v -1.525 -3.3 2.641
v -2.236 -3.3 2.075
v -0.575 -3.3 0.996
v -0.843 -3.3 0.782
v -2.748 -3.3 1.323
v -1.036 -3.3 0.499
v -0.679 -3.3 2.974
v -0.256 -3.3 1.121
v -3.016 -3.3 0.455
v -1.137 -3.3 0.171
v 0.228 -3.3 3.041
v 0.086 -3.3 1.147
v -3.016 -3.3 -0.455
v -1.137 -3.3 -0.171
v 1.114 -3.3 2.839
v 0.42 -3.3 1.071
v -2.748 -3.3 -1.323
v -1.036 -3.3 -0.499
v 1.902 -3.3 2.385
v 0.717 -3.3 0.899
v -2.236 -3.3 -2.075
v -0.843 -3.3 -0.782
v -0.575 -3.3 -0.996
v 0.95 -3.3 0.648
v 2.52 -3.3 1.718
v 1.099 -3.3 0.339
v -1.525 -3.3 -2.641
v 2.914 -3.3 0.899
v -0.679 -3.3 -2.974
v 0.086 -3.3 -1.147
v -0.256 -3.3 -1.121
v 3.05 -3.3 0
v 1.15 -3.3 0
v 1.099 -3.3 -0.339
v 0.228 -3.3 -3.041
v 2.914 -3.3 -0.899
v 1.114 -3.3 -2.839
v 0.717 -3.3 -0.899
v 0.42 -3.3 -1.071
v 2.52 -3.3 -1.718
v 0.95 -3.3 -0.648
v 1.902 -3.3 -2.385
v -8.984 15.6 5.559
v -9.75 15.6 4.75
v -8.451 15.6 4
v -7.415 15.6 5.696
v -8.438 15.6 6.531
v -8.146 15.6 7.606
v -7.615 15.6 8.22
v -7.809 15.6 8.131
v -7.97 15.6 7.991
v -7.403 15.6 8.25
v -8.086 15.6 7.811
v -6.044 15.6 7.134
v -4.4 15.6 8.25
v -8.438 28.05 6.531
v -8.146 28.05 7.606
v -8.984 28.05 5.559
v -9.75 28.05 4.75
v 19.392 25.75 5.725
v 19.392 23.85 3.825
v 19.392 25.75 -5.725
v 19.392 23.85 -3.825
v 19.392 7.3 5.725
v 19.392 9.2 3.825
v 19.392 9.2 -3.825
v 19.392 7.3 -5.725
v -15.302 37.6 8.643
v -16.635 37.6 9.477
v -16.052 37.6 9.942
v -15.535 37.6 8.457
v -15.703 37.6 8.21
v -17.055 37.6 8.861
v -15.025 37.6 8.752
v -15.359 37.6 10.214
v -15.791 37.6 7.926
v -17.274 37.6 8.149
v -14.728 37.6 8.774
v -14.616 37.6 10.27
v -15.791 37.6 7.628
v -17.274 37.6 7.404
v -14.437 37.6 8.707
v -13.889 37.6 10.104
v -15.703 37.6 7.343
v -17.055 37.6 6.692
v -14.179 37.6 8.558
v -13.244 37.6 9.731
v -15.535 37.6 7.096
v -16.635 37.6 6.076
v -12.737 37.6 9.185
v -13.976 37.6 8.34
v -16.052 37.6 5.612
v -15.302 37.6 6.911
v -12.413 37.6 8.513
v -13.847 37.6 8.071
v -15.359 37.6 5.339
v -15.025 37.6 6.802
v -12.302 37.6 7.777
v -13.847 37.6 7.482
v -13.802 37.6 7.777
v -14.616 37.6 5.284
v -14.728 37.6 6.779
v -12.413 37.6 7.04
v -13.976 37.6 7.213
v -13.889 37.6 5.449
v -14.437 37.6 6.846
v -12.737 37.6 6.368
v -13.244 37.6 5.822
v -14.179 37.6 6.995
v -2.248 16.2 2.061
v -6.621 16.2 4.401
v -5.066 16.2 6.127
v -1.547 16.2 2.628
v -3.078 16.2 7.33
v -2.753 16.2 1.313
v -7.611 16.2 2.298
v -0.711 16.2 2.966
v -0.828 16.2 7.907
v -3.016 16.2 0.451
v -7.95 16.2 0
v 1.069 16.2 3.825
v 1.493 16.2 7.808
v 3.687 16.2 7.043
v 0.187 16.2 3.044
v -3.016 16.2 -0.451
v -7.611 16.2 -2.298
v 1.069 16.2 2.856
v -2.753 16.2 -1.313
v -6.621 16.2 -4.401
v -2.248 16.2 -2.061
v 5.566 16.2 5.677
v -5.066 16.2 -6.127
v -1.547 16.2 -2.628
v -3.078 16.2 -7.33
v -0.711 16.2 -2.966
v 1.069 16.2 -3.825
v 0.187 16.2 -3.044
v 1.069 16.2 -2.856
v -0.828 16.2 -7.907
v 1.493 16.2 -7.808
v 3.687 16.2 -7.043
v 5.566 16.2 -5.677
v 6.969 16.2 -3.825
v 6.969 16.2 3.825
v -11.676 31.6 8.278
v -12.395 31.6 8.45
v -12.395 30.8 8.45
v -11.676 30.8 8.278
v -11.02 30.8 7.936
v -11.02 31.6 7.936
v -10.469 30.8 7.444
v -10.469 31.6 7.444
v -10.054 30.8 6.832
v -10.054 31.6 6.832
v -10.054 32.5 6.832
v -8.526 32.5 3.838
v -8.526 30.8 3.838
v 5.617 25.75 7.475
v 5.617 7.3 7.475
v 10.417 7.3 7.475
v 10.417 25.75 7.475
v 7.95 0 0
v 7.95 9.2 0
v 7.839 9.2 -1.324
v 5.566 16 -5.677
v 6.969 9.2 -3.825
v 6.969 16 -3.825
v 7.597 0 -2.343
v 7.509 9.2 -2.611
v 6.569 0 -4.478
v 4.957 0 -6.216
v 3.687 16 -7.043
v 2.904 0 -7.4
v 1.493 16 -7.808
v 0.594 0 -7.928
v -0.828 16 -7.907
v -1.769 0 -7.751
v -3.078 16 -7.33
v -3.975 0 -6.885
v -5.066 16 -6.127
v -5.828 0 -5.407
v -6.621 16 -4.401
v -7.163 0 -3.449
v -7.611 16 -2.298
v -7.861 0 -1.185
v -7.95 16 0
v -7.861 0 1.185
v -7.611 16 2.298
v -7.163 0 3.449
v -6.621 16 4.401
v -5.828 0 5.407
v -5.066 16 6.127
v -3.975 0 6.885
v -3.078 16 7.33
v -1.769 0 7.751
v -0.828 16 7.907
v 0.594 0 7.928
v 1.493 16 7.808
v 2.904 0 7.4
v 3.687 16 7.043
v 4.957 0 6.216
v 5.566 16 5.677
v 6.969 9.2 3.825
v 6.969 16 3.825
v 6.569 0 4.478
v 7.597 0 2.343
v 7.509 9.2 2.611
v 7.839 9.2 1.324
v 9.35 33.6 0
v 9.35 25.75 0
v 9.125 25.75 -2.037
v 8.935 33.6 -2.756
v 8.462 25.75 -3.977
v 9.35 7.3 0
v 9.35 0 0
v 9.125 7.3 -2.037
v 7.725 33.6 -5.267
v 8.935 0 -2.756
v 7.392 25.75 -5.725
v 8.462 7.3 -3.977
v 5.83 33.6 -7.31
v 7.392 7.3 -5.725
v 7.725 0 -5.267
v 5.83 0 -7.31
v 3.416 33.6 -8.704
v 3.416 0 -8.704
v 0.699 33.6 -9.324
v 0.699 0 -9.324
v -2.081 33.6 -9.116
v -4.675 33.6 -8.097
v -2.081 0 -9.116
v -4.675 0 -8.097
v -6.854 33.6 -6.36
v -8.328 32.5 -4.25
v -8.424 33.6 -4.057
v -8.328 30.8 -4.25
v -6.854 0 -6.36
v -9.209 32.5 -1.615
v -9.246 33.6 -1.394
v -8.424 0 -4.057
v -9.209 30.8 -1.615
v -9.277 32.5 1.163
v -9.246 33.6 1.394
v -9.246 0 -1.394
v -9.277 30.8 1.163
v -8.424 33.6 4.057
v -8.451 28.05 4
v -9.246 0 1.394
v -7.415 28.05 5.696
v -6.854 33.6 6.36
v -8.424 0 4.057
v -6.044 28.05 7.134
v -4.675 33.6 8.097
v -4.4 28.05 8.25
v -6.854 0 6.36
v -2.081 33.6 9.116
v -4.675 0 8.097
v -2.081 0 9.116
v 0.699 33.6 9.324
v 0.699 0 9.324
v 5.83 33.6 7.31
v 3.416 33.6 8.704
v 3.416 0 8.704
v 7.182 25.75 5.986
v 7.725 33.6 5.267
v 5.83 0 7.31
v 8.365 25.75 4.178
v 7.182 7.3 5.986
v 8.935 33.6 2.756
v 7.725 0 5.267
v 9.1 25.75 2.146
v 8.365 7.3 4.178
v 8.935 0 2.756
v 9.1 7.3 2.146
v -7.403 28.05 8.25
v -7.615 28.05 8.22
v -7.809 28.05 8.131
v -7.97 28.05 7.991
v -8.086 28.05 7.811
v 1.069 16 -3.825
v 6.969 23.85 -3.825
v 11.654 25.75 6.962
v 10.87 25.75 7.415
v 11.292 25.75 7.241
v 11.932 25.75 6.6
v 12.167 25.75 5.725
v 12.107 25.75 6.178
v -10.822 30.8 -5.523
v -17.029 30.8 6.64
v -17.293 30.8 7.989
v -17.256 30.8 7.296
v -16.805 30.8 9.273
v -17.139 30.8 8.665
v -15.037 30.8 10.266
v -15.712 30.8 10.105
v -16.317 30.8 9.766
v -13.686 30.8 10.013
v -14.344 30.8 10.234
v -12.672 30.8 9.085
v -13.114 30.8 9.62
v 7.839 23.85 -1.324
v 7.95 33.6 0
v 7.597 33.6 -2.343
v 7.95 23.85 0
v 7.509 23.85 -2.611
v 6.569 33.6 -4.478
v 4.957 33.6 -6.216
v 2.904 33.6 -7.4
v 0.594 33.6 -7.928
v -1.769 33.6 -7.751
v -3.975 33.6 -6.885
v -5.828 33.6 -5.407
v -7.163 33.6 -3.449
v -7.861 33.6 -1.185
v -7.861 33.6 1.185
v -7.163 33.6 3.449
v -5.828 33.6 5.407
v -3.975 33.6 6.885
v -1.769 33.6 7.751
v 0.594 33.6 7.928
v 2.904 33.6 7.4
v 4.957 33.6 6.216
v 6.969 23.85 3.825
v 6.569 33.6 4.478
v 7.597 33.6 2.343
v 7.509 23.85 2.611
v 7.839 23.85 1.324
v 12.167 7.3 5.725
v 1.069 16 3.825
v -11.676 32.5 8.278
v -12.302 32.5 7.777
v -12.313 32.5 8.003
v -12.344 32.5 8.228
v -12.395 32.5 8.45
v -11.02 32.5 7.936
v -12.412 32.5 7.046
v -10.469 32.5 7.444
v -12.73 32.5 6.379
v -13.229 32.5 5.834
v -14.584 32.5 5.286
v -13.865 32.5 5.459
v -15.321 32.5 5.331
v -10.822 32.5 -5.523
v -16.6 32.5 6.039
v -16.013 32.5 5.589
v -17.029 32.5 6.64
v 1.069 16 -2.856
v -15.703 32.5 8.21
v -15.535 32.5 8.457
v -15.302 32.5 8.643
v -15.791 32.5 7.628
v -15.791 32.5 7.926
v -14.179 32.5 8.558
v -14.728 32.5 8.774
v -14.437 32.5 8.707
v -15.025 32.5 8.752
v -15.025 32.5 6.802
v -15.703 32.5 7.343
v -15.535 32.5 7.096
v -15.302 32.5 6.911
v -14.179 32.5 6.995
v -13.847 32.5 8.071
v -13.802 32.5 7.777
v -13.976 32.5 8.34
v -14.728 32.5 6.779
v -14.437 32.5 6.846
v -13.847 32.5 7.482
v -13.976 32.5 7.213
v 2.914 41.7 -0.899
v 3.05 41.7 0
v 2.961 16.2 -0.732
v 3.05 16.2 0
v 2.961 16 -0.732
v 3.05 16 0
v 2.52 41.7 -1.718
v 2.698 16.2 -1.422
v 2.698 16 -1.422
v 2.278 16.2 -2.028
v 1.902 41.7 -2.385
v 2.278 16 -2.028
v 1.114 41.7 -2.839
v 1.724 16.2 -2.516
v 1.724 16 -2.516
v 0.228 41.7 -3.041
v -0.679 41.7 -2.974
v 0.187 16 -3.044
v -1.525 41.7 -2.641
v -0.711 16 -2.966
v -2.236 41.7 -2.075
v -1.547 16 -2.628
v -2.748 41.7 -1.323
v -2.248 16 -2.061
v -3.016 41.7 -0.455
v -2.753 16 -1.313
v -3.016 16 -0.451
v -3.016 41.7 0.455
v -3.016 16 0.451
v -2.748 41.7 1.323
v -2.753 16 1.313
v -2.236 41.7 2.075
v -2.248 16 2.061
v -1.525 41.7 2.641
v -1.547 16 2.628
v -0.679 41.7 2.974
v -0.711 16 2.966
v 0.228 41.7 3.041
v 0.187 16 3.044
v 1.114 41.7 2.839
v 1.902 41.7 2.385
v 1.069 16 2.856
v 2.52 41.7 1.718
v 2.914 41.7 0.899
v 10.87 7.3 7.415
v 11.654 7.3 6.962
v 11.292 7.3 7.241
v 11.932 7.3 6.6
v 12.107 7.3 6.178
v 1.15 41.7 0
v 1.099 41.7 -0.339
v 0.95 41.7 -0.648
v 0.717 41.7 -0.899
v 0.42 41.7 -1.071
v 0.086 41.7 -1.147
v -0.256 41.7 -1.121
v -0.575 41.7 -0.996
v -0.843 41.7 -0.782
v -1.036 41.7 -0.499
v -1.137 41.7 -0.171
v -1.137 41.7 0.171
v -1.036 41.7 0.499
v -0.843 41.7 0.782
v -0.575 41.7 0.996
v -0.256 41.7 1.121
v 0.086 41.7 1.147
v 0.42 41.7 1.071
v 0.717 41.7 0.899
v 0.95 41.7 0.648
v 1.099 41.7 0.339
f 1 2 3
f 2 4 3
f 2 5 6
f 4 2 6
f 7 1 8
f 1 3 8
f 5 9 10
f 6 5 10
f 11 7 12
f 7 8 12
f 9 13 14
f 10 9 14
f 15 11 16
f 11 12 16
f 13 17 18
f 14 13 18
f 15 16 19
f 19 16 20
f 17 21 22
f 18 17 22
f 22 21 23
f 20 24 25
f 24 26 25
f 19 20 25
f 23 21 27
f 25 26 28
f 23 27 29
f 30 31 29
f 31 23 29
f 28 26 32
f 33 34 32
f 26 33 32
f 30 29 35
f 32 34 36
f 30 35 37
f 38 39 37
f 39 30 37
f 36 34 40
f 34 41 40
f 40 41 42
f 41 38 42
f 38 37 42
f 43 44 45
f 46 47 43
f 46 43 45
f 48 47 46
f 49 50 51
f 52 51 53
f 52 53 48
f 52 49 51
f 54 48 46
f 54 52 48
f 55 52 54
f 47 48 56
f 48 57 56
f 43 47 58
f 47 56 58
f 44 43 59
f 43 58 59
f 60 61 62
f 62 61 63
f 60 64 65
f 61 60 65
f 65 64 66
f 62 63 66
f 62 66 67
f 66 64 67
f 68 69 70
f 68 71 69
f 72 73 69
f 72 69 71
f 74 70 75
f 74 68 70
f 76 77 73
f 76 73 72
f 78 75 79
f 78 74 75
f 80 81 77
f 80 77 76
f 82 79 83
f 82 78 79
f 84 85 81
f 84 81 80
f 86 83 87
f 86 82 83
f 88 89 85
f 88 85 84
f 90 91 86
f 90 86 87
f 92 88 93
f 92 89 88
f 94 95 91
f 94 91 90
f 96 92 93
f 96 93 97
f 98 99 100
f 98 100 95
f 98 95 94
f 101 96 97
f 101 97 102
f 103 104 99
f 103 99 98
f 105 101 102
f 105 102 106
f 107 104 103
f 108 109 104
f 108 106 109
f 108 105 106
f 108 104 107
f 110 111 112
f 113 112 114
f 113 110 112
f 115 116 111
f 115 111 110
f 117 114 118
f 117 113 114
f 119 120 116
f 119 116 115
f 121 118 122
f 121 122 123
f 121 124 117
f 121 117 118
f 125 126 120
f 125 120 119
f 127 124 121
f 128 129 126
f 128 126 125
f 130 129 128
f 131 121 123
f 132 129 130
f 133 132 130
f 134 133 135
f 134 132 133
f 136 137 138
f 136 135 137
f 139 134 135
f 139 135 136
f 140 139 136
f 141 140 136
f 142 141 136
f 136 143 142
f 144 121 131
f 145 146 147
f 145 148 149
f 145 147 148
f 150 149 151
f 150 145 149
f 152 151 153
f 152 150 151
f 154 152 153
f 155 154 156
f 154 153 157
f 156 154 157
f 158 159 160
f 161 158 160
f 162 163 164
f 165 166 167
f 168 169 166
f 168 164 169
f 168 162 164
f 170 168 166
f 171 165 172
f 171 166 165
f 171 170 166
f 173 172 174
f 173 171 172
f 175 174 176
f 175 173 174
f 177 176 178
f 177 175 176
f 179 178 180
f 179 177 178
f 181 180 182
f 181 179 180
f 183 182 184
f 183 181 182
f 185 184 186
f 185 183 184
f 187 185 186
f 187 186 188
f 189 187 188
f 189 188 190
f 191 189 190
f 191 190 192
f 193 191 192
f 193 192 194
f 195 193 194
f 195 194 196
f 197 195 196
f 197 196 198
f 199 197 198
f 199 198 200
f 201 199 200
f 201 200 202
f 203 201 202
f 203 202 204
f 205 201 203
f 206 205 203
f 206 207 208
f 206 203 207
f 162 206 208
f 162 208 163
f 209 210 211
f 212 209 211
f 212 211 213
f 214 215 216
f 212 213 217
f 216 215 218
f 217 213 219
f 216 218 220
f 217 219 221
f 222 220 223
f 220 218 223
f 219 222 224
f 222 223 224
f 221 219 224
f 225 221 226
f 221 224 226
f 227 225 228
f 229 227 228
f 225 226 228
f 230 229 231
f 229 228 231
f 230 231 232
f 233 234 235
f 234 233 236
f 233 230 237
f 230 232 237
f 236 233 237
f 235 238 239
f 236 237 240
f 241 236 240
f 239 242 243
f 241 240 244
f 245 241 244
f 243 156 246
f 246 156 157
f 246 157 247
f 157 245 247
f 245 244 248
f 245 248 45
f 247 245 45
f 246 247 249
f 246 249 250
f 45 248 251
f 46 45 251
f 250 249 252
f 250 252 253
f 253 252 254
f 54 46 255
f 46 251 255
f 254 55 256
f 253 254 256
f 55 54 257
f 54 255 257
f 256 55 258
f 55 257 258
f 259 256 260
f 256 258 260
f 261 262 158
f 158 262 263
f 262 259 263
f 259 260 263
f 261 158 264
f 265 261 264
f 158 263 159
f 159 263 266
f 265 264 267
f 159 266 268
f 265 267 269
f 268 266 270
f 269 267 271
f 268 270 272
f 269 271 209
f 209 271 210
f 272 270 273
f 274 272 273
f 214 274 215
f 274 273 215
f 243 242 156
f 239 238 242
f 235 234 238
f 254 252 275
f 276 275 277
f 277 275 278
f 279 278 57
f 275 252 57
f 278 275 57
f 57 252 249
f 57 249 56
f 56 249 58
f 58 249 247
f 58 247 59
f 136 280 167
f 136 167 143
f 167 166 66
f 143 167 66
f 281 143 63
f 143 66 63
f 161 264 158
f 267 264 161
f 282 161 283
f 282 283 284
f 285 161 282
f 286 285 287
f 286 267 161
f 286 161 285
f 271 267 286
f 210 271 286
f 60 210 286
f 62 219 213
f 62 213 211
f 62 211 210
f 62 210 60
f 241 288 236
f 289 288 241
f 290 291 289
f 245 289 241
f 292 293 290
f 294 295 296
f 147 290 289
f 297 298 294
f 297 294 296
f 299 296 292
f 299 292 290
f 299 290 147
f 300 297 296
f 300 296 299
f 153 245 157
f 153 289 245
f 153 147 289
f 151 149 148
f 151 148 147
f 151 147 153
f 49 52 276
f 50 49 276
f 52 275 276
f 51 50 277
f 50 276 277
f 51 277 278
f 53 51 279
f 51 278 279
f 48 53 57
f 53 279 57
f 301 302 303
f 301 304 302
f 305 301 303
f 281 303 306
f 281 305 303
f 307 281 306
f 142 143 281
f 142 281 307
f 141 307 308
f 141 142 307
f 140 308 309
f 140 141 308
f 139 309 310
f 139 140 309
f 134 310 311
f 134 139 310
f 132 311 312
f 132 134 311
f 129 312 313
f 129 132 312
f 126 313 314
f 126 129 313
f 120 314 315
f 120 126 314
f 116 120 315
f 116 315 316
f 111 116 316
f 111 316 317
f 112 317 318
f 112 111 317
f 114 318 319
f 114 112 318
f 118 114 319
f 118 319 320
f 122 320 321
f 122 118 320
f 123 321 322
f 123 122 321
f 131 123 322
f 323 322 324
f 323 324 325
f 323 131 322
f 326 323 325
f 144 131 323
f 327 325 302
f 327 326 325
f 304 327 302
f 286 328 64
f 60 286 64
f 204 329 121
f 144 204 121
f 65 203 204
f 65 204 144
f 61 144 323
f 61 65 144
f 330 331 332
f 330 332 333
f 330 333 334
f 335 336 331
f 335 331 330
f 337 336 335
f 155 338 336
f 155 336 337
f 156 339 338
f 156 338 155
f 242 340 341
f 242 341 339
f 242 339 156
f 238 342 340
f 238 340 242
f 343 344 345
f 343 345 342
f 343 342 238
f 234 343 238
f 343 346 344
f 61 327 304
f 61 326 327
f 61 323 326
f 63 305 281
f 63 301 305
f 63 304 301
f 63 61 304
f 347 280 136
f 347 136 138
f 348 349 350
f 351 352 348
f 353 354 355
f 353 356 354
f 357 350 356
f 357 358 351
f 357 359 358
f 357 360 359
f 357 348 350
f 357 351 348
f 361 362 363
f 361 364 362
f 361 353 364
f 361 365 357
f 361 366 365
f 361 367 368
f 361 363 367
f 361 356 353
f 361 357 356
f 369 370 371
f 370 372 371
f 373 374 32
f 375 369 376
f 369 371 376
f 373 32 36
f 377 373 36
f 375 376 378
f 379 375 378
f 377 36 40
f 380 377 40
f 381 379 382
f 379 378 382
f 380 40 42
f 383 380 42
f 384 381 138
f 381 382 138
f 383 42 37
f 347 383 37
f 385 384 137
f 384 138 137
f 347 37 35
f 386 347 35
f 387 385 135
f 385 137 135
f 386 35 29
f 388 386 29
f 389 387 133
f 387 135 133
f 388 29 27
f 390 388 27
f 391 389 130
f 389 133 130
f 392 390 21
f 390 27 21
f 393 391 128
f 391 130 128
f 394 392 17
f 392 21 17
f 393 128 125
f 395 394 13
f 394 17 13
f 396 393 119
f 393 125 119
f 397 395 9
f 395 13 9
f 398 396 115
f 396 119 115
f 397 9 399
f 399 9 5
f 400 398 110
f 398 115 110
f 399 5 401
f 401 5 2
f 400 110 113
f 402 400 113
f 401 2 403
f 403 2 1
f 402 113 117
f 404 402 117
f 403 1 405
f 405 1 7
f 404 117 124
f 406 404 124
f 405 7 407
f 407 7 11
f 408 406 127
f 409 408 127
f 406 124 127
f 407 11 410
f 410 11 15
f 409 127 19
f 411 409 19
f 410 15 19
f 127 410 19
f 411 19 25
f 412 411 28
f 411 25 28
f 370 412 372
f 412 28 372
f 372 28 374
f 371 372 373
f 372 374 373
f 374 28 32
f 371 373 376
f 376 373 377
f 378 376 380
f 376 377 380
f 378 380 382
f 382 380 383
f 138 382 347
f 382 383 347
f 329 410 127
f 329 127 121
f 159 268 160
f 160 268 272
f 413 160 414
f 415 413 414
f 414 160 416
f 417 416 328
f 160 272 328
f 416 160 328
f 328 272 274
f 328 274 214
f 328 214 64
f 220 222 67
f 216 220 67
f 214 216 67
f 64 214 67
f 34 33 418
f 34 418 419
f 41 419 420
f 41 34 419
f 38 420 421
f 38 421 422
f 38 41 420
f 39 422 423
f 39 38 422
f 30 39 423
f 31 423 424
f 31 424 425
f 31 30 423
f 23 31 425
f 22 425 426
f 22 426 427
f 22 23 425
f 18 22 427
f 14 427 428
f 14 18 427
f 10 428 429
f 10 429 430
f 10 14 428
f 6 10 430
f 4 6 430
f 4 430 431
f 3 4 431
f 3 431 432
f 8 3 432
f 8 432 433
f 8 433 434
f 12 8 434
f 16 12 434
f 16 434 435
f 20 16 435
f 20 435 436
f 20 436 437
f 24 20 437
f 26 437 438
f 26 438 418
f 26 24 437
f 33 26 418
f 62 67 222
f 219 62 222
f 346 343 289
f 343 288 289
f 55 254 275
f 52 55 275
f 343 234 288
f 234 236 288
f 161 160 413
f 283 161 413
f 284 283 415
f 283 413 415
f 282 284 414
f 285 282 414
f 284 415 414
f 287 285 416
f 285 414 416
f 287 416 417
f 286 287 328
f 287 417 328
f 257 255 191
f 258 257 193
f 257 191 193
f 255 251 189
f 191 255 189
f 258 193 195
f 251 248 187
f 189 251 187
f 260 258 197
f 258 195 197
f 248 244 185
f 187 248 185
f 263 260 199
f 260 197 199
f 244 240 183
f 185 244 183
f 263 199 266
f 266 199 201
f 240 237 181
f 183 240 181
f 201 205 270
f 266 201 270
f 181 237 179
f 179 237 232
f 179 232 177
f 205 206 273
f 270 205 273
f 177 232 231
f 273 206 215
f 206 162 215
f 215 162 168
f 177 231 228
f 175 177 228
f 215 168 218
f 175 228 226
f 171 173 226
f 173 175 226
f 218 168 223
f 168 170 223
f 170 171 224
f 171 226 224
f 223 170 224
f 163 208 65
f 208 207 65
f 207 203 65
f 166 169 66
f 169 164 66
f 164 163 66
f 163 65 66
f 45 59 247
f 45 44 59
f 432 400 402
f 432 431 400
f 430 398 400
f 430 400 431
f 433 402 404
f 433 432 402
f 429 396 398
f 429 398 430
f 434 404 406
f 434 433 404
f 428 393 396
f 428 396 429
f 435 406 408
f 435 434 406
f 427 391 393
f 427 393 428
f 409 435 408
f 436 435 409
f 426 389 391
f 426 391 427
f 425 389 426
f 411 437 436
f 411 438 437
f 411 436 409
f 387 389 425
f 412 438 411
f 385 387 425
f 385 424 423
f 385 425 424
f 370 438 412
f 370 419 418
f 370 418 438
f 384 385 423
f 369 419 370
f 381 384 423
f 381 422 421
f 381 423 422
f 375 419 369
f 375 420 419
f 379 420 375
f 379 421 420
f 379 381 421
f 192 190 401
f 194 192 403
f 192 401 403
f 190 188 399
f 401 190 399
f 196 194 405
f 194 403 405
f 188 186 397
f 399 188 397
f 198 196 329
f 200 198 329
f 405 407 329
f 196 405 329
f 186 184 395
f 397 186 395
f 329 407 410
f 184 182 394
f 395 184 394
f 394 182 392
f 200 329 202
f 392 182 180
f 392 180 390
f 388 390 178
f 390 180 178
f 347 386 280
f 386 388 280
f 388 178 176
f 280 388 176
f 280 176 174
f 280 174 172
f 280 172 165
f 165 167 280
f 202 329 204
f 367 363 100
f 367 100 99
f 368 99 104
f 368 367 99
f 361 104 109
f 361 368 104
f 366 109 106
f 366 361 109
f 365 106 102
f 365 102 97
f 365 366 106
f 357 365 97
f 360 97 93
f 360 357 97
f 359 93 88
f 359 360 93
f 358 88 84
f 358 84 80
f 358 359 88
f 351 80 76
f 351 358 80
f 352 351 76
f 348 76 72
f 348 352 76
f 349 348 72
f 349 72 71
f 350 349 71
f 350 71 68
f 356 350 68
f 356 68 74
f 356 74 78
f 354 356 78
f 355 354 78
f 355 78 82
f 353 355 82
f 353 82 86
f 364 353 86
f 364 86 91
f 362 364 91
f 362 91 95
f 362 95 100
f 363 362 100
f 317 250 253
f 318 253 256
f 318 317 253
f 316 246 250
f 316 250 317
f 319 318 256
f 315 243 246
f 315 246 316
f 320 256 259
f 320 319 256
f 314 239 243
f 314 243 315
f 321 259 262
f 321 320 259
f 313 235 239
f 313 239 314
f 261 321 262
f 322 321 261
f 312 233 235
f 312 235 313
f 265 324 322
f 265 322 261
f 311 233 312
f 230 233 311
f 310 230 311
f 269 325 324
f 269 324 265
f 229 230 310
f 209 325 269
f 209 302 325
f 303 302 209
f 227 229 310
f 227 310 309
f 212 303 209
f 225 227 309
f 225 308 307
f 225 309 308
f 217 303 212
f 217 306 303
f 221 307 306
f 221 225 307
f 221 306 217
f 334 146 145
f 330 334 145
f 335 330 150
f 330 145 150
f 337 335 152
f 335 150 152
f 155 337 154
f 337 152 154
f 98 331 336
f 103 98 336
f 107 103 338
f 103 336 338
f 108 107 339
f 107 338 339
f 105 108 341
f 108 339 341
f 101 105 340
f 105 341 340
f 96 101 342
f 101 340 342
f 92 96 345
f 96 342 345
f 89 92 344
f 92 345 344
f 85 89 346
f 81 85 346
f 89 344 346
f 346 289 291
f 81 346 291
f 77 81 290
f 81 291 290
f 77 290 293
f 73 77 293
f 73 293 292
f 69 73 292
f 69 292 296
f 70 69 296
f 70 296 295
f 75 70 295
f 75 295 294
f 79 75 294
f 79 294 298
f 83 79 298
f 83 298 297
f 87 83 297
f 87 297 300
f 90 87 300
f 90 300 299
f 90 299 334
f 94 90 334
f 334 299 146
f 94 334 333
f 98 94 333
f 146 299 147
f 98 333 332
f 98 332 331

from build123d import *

# Parameters (mm, degrees)
SKETCH1_R            = 9.35
SKETCH1_R_2          = 7.95
BOSS_EXTRUDE1_DEPTH  = 31.6
SKETCH2_R            = 3.05
SKETCH2_R_2          = 1.15
BOSS_EXTRUDE2_DEPTH  = 45
BOSS_EXTRUDE3_DEPTH  = 18.45
SKETCH5_W            = 7.65
SKETCH5_H            = 14.65
CUT_EXTRUDE1_DEPTH   = 15
SKETCH6_R            = 7.95
SKETCH6_R_2          = 3.05
BOSS_EXTRUDE4_DEPTH  = 0.2
CUT_EXTRUDE4_DEPTH   = 0.2
BOSS_EXTRUDE5_DEPTH  = 7.45
BOSS_EXTRUDE6_DEPTH  = 1.7
BOSS_EXTRUDE7_START  = -1.7
SKETCH10_R           = 2.5
SKETCH10_R_2         = 1
BOSS_EXTRUDE7_DEPTH  = 7.7
BOSS_EXTRUDE8_DEPTH  = 1.7
BOSS_EXTRUDE9_DEPTH  = 5
SKETCH13_R           = 9.35
SKETCH13_R_2         = 7.95
BOSS_EXTRUDE12_DEPTH = 2
BOSS_EXTRUDE13_DEPTH = 1.7
CUT_EXTRUDE5_DEPTH   = 0.9
BOSS_EXTRUDE14_DEPTH = 0.9


with BuildPart() as part:
    # Sketch1 → Boss-Extrude1 (new body)
    with BuildSketch(Plane(origin=(0, 0, 0), x_dir=(1, 0, 0), z_dir=(0, 1, 0))):
        Circle(SKETCH1_R)
        Circle(SKETCH1_R_2, mode=Mode.SUBTRACT)
    extrude(amount=BOSS_EXTRUDE1_DEPTH)

    # Sketch4 → Boss-Extrude3 (add)
    with BuildSketch(Plane(origin=(0, 7.3, 0), x_dir=(1, 0, 0), z_dir=(0, 1, 0))):
        with BuildLine():
            Line((19.392352467, 5.725), (7.392352467, 5.725))
            ThreePointArc((7.392352467, 5.725), (9.266531417, -1.24655345), (5.616660485, -7.475))
            Line((5.616660485, -7.475), (10.416660485, -7.475))
            ThreePointArc((10.416660485, -7.475), (11.654097352, -6.962436867), (12.166660485, -5.725))
            Line((12.166660485, -5.725), (19.392352467, -5.725))
            Line((19.392352467, -5.725), (19.392352467, 5.725))
        make_face()
    extrude(amount=BOSS_EXTRUDE3_DEPTH)

    # Sketch5 → Cut-Extrude1 (cut)
    with BuildSketch(Plane(origin=(19.392352467, 0, 0), x_dir=(0, 0, -1), z_dir=(1, 0, 0))):
        with Locations((0, 16.525)):
            Rectangle(SKETCH5_W, SKETCH5_H)
    extrude(amount=-CUT_EXTRUDE1_DEPTH, mode=Mode.SUBTRACT)



with BuildPart() as body_2:
    # Sketch2 → Boss-Extrude2 (new body)
    with BuildSketch(Plane(origin=(0, -3.3, 0), x_dir=(1, 0, 0), z_dir=(0, 1, 0))):
        Circle(SKETCH2_R)
        Circle(SKETCH2_R_2, mode=Mode.SUBTRACT)
    extrude(amount=BOSS_EXTRUDE2_DEPTH)


with BuildPart() as part_1:
    add(part.part)

    add(body_2.part)  # Boss-Extrude4 merges body 2
    # Sketch6 → Boss-Extrude4 (add)
    with BuildSketch(Plane(origin=(0, 16, 0), x_dir=(1, 0, 0), z_dir=(0, 1, 0))):
        Circle(SKETCH6_R)
        Circle(SKETCH6_R_2, mode=Mode.SUBTRACT)
    extrude(amount=BOSS_EXTRUDE4_DEPTH)

    # Sketch7 → Cut-Extrude4 (cut)
    with BuildSketch(Plane(origin=(0, 16, 0), x_dir=(1, 0, 0), z_dir=(0, 1, 0))):
        with BuildLine():
            Line((6.969352552, 3.825), (1.069352552, 3.825))
            Line((1.069352552, 3.825), (1.069352552, 2.856393726))
            ThreePointArc((1.069352552, 2.856393726), (3.05, 0), (1.069352552, -2.856393726))
            Line((1.069352552, -2.856393726), (1.069352552, -3.825))
            Line((1.069352552, -3.825), (6.969352552, -3.825))
            ThreePointArc((6.969352552, -3.825), (7.95, 0), (6.969352552, 3.825))
        make_face()
    extrude(amount=CUT_EXTRUDE4_DEPTH, mode=Mode.SUBTRACT)

    # Sketch8 → Boss-Extrude5 (add)
    with BuildSketch(Plane(origin=(0, 20.6, 0), x_dir=(1, 0, 0), z_dir=(0, 1, 0))):
        with BuildLine():
            Line((-4.4, -8.25), (-7.403469592, -8.25))
            ThreePointArc((-7.403469592, -8.25), (-7.894744058, -8.066700449), (-8.145884154, -7.606398397))
            ThreePointArc((-8.145884154, -7.606398397), (-8.681216078, -6.028326508), (-9.750221455, -4.75))
            Line((-9.750221455, -4.75), (-8.451183349, -4))
            ThreePointArc((-8.451183349, -4), (-6.767854414, -6.451251555), (-4.4, -8.25))
        make_face()
    extrude(amount=BOSS_EXTRUDE5_DEPTH)

    # Sketch12 → Boss-Extrude9 (add)
    with BuildSketch(Plane.XZ.offset(-20.6)):
        with BuildLine():
            Line((-4.4, 8.25), (-7.403469592, 8.25))
            ThreePointArc((-7.403469592, 8.25), (-7.894744058, 8.066700449), (-8.145884154, 7.606398397))
            ThreePointArc((-8.145884154, 7.606398397), (-8.681216078, 6.028326508), (-9.750221455, 4.75))
            Line((-9.750221455, 4.75), (-8.451183349, 4))
            ThreePointArc((-8.451183349, 4), (-6.767854414, 6.451251555), (-4.4, 8.25))
        make_face()
    extrude(amount=BOSS_EXTRUDE9_DEPTH)



with BuildPart() as body_2_2:
    # Sketch9 → Boss-Extrude6 (new body)
    with BuildSketch(Plane(origin=(0, 31.6, 0), x_dir=(1, 0, 0), z_dir=(0, 1, 0))):
        with BuildLine():
            Line((-8.328265125, 4.25), (-10.822291045, 5.522727273))
            Line((-10.822291045, 5.522727273), (-17.029180659, -6.640242682))
            Line((-17.029180659, -6.640242682), (-14.089792968, -8.140242682))
            ThreePointArc((-14.089792968, -8.140242682), (-11.800883152, -8.321818546), (-10.053985976, -6.831708418))
            Line((-10.053985976, -6.831708418), (-8.526111367, -3.837697872))
            ThreePointArc((-8.526111367, -3.837697872), (-9.347203644, 0.228657047), (-8.328265125, 4.25))
        make_face()
    extrude(amount=-BOSS_EXTRUDE6_DEPTH)

    # Sketch10 → Boss-Extrude7 (add)
    with BuildSketch(Plane(origin=(0, 31.6, 0), x_dir=(1, 0, 0), z_dir=(0, 1, 0)).offset(BOSS_EXTRUDE7_START)):
        with Locations((-14.802371802, -7.776606319)):
            Circle(SKETCH10_R)
        with Locations((-14.802371802, -7.776606319)):
            Circle(SKETCH10_R_2, mode=Mode.SUBTRACT)
    extrude(amount=BOSS_EXTRUDE7_DEPTH)

    # Sketch11 → Boss-Extrude8 (add)
    with BuildSketch(Plane(origin=(0, 31.6, 0), x_dir=(1, 0, 0), z_dir=(0, 1, 0))):
        with BuildLine():
            Line((-15.693095345, -7.322060864), (-14.089792968, -8.140242682))
            ThreePointArc((-14.089792968, -8.140242682), (-13.999922503, -8.184231187), (-13.908635087, -8.225198209))
            ThreePointArc((-13.908635087, -8.225198209), (-15.253942988, -8.668841413), (-15.693095345, -7.322060864))
        make_face()
    extrude(amount=-BOSS_EXTRUDE8_DEPTH)


with BuildPart() as part_2:
    add(part_1.part)

    add(body_2_2.part)  # Boss-Extrude12 merges body 2 2
    # Sketch13 → Boss-Extrude12 (add)
    with BuildSketch(Plane(origin=(0, 31.6, 0), x_dir=(1, 0, 0), z_dir=(0, 1, 0))):
        Circle(SKETCH13_R)
        Circle(SKETCH13_R_2, mode=Mode.SUBTRACT)
    extrude(amount=BOSS_EXTRUDE12_DEPTH)

    # Sketch14 → Boss-Extrude13 (add)
    with BuildSketch(Plane(origin=(0, 31.6, 0), x_dir=(1, 0, 0), z_dir=(0, 1, 0))):
        with BuildLine():
            Line((-10.053985976, -6.831708418), (-8.526111367, -3.837697872))
            ThreePointArc((-8.526111367, -3.837697872), (-9.347203644, 0.228657047), (-8.328265125, 4.25))
            Line((-8.328265125, 4.25), (-10.822291045, 5.522727273))
            Line((-10.822291045, 5.522727273), (-17.029180659, -6.640242682))
            ThreePointArc((-17.029180659, -6.640242682), (-15.711611281, -10.105400764), (-12.394688357, -8.449703956))
            ThreePointArc((-12.394688357, -8.449703956), (-11.020302269, -7.935876946), (-10.053985976, -6.831708418))
        make_face()
    extrude(amount=-BOSS_EXTRUDE13_DEPTH)

    # Sketch15 → Cut-Extrude5 (cut)
    with BuildSketch(Plane.XZ.offset(-29.9)):
        with BuildLine():
            Line((-17.029180659, 6.640242682), (-10.822291045, -5.522727273))
            Line((-10.822291045, -5.522727273), (-8.328265125, -4.25))
            ThreePointArc((-8.328265125, -4.25), (-9.347203644, -0.228657047), (-8.526111367, 3.837697872))
            Line((-8.526111367, 3.837697872), (-10.053985976, 6.831708418))
            ThreePointArc((-10.053985976, 6.831708418), (-11.020302269, 7.935876946), (-12.394688357, 8.449703956))
            ThreePointArc((-12.394688357, 8.449703956), (-15.711611281, 10.105400764), (-17.029180659, 6.640242682))
        make_face()
    extrude(amount=-CUT_EXTRUDE5_DEPTH, mode=Mode.SUBTRACT)

    # Sketch17 → Boss-Extrude14 (add)
    with BuildSketch(Plane(origin=(0, 31.6, 0), x_dir=(1, 0, 0), z_dir=(0, 1, 0))):
        with BuildLine():
            Line((-10.053985976, -6.831708418), (-8.526111367, -3.837697872))
            ThreePointArc((-8.526111367, -3.837697872), (-9.347203644, 0.228657047), (-8.328265125, 4.25))
            Line((-8.328265125, 4.25), (-10.822291045, 5.522727273))
            Line((-10.822291045, 5.522727273), (-17.029180659, -6.640242682))
            ThreePointArc((-17.029180659, -6.640242682), (-15.711611281, -10.105400764), (-12.394688357, -8.449703956))
            ThreePointArc((-12.394688357, -8.449703956), (-11.020302269, -7.935876946), (-10.053985976, -6.831708418))
        make_face()
    extrude(amount=BOSS_EXTRUDE14_DEPTH)


solid = part_2.part
